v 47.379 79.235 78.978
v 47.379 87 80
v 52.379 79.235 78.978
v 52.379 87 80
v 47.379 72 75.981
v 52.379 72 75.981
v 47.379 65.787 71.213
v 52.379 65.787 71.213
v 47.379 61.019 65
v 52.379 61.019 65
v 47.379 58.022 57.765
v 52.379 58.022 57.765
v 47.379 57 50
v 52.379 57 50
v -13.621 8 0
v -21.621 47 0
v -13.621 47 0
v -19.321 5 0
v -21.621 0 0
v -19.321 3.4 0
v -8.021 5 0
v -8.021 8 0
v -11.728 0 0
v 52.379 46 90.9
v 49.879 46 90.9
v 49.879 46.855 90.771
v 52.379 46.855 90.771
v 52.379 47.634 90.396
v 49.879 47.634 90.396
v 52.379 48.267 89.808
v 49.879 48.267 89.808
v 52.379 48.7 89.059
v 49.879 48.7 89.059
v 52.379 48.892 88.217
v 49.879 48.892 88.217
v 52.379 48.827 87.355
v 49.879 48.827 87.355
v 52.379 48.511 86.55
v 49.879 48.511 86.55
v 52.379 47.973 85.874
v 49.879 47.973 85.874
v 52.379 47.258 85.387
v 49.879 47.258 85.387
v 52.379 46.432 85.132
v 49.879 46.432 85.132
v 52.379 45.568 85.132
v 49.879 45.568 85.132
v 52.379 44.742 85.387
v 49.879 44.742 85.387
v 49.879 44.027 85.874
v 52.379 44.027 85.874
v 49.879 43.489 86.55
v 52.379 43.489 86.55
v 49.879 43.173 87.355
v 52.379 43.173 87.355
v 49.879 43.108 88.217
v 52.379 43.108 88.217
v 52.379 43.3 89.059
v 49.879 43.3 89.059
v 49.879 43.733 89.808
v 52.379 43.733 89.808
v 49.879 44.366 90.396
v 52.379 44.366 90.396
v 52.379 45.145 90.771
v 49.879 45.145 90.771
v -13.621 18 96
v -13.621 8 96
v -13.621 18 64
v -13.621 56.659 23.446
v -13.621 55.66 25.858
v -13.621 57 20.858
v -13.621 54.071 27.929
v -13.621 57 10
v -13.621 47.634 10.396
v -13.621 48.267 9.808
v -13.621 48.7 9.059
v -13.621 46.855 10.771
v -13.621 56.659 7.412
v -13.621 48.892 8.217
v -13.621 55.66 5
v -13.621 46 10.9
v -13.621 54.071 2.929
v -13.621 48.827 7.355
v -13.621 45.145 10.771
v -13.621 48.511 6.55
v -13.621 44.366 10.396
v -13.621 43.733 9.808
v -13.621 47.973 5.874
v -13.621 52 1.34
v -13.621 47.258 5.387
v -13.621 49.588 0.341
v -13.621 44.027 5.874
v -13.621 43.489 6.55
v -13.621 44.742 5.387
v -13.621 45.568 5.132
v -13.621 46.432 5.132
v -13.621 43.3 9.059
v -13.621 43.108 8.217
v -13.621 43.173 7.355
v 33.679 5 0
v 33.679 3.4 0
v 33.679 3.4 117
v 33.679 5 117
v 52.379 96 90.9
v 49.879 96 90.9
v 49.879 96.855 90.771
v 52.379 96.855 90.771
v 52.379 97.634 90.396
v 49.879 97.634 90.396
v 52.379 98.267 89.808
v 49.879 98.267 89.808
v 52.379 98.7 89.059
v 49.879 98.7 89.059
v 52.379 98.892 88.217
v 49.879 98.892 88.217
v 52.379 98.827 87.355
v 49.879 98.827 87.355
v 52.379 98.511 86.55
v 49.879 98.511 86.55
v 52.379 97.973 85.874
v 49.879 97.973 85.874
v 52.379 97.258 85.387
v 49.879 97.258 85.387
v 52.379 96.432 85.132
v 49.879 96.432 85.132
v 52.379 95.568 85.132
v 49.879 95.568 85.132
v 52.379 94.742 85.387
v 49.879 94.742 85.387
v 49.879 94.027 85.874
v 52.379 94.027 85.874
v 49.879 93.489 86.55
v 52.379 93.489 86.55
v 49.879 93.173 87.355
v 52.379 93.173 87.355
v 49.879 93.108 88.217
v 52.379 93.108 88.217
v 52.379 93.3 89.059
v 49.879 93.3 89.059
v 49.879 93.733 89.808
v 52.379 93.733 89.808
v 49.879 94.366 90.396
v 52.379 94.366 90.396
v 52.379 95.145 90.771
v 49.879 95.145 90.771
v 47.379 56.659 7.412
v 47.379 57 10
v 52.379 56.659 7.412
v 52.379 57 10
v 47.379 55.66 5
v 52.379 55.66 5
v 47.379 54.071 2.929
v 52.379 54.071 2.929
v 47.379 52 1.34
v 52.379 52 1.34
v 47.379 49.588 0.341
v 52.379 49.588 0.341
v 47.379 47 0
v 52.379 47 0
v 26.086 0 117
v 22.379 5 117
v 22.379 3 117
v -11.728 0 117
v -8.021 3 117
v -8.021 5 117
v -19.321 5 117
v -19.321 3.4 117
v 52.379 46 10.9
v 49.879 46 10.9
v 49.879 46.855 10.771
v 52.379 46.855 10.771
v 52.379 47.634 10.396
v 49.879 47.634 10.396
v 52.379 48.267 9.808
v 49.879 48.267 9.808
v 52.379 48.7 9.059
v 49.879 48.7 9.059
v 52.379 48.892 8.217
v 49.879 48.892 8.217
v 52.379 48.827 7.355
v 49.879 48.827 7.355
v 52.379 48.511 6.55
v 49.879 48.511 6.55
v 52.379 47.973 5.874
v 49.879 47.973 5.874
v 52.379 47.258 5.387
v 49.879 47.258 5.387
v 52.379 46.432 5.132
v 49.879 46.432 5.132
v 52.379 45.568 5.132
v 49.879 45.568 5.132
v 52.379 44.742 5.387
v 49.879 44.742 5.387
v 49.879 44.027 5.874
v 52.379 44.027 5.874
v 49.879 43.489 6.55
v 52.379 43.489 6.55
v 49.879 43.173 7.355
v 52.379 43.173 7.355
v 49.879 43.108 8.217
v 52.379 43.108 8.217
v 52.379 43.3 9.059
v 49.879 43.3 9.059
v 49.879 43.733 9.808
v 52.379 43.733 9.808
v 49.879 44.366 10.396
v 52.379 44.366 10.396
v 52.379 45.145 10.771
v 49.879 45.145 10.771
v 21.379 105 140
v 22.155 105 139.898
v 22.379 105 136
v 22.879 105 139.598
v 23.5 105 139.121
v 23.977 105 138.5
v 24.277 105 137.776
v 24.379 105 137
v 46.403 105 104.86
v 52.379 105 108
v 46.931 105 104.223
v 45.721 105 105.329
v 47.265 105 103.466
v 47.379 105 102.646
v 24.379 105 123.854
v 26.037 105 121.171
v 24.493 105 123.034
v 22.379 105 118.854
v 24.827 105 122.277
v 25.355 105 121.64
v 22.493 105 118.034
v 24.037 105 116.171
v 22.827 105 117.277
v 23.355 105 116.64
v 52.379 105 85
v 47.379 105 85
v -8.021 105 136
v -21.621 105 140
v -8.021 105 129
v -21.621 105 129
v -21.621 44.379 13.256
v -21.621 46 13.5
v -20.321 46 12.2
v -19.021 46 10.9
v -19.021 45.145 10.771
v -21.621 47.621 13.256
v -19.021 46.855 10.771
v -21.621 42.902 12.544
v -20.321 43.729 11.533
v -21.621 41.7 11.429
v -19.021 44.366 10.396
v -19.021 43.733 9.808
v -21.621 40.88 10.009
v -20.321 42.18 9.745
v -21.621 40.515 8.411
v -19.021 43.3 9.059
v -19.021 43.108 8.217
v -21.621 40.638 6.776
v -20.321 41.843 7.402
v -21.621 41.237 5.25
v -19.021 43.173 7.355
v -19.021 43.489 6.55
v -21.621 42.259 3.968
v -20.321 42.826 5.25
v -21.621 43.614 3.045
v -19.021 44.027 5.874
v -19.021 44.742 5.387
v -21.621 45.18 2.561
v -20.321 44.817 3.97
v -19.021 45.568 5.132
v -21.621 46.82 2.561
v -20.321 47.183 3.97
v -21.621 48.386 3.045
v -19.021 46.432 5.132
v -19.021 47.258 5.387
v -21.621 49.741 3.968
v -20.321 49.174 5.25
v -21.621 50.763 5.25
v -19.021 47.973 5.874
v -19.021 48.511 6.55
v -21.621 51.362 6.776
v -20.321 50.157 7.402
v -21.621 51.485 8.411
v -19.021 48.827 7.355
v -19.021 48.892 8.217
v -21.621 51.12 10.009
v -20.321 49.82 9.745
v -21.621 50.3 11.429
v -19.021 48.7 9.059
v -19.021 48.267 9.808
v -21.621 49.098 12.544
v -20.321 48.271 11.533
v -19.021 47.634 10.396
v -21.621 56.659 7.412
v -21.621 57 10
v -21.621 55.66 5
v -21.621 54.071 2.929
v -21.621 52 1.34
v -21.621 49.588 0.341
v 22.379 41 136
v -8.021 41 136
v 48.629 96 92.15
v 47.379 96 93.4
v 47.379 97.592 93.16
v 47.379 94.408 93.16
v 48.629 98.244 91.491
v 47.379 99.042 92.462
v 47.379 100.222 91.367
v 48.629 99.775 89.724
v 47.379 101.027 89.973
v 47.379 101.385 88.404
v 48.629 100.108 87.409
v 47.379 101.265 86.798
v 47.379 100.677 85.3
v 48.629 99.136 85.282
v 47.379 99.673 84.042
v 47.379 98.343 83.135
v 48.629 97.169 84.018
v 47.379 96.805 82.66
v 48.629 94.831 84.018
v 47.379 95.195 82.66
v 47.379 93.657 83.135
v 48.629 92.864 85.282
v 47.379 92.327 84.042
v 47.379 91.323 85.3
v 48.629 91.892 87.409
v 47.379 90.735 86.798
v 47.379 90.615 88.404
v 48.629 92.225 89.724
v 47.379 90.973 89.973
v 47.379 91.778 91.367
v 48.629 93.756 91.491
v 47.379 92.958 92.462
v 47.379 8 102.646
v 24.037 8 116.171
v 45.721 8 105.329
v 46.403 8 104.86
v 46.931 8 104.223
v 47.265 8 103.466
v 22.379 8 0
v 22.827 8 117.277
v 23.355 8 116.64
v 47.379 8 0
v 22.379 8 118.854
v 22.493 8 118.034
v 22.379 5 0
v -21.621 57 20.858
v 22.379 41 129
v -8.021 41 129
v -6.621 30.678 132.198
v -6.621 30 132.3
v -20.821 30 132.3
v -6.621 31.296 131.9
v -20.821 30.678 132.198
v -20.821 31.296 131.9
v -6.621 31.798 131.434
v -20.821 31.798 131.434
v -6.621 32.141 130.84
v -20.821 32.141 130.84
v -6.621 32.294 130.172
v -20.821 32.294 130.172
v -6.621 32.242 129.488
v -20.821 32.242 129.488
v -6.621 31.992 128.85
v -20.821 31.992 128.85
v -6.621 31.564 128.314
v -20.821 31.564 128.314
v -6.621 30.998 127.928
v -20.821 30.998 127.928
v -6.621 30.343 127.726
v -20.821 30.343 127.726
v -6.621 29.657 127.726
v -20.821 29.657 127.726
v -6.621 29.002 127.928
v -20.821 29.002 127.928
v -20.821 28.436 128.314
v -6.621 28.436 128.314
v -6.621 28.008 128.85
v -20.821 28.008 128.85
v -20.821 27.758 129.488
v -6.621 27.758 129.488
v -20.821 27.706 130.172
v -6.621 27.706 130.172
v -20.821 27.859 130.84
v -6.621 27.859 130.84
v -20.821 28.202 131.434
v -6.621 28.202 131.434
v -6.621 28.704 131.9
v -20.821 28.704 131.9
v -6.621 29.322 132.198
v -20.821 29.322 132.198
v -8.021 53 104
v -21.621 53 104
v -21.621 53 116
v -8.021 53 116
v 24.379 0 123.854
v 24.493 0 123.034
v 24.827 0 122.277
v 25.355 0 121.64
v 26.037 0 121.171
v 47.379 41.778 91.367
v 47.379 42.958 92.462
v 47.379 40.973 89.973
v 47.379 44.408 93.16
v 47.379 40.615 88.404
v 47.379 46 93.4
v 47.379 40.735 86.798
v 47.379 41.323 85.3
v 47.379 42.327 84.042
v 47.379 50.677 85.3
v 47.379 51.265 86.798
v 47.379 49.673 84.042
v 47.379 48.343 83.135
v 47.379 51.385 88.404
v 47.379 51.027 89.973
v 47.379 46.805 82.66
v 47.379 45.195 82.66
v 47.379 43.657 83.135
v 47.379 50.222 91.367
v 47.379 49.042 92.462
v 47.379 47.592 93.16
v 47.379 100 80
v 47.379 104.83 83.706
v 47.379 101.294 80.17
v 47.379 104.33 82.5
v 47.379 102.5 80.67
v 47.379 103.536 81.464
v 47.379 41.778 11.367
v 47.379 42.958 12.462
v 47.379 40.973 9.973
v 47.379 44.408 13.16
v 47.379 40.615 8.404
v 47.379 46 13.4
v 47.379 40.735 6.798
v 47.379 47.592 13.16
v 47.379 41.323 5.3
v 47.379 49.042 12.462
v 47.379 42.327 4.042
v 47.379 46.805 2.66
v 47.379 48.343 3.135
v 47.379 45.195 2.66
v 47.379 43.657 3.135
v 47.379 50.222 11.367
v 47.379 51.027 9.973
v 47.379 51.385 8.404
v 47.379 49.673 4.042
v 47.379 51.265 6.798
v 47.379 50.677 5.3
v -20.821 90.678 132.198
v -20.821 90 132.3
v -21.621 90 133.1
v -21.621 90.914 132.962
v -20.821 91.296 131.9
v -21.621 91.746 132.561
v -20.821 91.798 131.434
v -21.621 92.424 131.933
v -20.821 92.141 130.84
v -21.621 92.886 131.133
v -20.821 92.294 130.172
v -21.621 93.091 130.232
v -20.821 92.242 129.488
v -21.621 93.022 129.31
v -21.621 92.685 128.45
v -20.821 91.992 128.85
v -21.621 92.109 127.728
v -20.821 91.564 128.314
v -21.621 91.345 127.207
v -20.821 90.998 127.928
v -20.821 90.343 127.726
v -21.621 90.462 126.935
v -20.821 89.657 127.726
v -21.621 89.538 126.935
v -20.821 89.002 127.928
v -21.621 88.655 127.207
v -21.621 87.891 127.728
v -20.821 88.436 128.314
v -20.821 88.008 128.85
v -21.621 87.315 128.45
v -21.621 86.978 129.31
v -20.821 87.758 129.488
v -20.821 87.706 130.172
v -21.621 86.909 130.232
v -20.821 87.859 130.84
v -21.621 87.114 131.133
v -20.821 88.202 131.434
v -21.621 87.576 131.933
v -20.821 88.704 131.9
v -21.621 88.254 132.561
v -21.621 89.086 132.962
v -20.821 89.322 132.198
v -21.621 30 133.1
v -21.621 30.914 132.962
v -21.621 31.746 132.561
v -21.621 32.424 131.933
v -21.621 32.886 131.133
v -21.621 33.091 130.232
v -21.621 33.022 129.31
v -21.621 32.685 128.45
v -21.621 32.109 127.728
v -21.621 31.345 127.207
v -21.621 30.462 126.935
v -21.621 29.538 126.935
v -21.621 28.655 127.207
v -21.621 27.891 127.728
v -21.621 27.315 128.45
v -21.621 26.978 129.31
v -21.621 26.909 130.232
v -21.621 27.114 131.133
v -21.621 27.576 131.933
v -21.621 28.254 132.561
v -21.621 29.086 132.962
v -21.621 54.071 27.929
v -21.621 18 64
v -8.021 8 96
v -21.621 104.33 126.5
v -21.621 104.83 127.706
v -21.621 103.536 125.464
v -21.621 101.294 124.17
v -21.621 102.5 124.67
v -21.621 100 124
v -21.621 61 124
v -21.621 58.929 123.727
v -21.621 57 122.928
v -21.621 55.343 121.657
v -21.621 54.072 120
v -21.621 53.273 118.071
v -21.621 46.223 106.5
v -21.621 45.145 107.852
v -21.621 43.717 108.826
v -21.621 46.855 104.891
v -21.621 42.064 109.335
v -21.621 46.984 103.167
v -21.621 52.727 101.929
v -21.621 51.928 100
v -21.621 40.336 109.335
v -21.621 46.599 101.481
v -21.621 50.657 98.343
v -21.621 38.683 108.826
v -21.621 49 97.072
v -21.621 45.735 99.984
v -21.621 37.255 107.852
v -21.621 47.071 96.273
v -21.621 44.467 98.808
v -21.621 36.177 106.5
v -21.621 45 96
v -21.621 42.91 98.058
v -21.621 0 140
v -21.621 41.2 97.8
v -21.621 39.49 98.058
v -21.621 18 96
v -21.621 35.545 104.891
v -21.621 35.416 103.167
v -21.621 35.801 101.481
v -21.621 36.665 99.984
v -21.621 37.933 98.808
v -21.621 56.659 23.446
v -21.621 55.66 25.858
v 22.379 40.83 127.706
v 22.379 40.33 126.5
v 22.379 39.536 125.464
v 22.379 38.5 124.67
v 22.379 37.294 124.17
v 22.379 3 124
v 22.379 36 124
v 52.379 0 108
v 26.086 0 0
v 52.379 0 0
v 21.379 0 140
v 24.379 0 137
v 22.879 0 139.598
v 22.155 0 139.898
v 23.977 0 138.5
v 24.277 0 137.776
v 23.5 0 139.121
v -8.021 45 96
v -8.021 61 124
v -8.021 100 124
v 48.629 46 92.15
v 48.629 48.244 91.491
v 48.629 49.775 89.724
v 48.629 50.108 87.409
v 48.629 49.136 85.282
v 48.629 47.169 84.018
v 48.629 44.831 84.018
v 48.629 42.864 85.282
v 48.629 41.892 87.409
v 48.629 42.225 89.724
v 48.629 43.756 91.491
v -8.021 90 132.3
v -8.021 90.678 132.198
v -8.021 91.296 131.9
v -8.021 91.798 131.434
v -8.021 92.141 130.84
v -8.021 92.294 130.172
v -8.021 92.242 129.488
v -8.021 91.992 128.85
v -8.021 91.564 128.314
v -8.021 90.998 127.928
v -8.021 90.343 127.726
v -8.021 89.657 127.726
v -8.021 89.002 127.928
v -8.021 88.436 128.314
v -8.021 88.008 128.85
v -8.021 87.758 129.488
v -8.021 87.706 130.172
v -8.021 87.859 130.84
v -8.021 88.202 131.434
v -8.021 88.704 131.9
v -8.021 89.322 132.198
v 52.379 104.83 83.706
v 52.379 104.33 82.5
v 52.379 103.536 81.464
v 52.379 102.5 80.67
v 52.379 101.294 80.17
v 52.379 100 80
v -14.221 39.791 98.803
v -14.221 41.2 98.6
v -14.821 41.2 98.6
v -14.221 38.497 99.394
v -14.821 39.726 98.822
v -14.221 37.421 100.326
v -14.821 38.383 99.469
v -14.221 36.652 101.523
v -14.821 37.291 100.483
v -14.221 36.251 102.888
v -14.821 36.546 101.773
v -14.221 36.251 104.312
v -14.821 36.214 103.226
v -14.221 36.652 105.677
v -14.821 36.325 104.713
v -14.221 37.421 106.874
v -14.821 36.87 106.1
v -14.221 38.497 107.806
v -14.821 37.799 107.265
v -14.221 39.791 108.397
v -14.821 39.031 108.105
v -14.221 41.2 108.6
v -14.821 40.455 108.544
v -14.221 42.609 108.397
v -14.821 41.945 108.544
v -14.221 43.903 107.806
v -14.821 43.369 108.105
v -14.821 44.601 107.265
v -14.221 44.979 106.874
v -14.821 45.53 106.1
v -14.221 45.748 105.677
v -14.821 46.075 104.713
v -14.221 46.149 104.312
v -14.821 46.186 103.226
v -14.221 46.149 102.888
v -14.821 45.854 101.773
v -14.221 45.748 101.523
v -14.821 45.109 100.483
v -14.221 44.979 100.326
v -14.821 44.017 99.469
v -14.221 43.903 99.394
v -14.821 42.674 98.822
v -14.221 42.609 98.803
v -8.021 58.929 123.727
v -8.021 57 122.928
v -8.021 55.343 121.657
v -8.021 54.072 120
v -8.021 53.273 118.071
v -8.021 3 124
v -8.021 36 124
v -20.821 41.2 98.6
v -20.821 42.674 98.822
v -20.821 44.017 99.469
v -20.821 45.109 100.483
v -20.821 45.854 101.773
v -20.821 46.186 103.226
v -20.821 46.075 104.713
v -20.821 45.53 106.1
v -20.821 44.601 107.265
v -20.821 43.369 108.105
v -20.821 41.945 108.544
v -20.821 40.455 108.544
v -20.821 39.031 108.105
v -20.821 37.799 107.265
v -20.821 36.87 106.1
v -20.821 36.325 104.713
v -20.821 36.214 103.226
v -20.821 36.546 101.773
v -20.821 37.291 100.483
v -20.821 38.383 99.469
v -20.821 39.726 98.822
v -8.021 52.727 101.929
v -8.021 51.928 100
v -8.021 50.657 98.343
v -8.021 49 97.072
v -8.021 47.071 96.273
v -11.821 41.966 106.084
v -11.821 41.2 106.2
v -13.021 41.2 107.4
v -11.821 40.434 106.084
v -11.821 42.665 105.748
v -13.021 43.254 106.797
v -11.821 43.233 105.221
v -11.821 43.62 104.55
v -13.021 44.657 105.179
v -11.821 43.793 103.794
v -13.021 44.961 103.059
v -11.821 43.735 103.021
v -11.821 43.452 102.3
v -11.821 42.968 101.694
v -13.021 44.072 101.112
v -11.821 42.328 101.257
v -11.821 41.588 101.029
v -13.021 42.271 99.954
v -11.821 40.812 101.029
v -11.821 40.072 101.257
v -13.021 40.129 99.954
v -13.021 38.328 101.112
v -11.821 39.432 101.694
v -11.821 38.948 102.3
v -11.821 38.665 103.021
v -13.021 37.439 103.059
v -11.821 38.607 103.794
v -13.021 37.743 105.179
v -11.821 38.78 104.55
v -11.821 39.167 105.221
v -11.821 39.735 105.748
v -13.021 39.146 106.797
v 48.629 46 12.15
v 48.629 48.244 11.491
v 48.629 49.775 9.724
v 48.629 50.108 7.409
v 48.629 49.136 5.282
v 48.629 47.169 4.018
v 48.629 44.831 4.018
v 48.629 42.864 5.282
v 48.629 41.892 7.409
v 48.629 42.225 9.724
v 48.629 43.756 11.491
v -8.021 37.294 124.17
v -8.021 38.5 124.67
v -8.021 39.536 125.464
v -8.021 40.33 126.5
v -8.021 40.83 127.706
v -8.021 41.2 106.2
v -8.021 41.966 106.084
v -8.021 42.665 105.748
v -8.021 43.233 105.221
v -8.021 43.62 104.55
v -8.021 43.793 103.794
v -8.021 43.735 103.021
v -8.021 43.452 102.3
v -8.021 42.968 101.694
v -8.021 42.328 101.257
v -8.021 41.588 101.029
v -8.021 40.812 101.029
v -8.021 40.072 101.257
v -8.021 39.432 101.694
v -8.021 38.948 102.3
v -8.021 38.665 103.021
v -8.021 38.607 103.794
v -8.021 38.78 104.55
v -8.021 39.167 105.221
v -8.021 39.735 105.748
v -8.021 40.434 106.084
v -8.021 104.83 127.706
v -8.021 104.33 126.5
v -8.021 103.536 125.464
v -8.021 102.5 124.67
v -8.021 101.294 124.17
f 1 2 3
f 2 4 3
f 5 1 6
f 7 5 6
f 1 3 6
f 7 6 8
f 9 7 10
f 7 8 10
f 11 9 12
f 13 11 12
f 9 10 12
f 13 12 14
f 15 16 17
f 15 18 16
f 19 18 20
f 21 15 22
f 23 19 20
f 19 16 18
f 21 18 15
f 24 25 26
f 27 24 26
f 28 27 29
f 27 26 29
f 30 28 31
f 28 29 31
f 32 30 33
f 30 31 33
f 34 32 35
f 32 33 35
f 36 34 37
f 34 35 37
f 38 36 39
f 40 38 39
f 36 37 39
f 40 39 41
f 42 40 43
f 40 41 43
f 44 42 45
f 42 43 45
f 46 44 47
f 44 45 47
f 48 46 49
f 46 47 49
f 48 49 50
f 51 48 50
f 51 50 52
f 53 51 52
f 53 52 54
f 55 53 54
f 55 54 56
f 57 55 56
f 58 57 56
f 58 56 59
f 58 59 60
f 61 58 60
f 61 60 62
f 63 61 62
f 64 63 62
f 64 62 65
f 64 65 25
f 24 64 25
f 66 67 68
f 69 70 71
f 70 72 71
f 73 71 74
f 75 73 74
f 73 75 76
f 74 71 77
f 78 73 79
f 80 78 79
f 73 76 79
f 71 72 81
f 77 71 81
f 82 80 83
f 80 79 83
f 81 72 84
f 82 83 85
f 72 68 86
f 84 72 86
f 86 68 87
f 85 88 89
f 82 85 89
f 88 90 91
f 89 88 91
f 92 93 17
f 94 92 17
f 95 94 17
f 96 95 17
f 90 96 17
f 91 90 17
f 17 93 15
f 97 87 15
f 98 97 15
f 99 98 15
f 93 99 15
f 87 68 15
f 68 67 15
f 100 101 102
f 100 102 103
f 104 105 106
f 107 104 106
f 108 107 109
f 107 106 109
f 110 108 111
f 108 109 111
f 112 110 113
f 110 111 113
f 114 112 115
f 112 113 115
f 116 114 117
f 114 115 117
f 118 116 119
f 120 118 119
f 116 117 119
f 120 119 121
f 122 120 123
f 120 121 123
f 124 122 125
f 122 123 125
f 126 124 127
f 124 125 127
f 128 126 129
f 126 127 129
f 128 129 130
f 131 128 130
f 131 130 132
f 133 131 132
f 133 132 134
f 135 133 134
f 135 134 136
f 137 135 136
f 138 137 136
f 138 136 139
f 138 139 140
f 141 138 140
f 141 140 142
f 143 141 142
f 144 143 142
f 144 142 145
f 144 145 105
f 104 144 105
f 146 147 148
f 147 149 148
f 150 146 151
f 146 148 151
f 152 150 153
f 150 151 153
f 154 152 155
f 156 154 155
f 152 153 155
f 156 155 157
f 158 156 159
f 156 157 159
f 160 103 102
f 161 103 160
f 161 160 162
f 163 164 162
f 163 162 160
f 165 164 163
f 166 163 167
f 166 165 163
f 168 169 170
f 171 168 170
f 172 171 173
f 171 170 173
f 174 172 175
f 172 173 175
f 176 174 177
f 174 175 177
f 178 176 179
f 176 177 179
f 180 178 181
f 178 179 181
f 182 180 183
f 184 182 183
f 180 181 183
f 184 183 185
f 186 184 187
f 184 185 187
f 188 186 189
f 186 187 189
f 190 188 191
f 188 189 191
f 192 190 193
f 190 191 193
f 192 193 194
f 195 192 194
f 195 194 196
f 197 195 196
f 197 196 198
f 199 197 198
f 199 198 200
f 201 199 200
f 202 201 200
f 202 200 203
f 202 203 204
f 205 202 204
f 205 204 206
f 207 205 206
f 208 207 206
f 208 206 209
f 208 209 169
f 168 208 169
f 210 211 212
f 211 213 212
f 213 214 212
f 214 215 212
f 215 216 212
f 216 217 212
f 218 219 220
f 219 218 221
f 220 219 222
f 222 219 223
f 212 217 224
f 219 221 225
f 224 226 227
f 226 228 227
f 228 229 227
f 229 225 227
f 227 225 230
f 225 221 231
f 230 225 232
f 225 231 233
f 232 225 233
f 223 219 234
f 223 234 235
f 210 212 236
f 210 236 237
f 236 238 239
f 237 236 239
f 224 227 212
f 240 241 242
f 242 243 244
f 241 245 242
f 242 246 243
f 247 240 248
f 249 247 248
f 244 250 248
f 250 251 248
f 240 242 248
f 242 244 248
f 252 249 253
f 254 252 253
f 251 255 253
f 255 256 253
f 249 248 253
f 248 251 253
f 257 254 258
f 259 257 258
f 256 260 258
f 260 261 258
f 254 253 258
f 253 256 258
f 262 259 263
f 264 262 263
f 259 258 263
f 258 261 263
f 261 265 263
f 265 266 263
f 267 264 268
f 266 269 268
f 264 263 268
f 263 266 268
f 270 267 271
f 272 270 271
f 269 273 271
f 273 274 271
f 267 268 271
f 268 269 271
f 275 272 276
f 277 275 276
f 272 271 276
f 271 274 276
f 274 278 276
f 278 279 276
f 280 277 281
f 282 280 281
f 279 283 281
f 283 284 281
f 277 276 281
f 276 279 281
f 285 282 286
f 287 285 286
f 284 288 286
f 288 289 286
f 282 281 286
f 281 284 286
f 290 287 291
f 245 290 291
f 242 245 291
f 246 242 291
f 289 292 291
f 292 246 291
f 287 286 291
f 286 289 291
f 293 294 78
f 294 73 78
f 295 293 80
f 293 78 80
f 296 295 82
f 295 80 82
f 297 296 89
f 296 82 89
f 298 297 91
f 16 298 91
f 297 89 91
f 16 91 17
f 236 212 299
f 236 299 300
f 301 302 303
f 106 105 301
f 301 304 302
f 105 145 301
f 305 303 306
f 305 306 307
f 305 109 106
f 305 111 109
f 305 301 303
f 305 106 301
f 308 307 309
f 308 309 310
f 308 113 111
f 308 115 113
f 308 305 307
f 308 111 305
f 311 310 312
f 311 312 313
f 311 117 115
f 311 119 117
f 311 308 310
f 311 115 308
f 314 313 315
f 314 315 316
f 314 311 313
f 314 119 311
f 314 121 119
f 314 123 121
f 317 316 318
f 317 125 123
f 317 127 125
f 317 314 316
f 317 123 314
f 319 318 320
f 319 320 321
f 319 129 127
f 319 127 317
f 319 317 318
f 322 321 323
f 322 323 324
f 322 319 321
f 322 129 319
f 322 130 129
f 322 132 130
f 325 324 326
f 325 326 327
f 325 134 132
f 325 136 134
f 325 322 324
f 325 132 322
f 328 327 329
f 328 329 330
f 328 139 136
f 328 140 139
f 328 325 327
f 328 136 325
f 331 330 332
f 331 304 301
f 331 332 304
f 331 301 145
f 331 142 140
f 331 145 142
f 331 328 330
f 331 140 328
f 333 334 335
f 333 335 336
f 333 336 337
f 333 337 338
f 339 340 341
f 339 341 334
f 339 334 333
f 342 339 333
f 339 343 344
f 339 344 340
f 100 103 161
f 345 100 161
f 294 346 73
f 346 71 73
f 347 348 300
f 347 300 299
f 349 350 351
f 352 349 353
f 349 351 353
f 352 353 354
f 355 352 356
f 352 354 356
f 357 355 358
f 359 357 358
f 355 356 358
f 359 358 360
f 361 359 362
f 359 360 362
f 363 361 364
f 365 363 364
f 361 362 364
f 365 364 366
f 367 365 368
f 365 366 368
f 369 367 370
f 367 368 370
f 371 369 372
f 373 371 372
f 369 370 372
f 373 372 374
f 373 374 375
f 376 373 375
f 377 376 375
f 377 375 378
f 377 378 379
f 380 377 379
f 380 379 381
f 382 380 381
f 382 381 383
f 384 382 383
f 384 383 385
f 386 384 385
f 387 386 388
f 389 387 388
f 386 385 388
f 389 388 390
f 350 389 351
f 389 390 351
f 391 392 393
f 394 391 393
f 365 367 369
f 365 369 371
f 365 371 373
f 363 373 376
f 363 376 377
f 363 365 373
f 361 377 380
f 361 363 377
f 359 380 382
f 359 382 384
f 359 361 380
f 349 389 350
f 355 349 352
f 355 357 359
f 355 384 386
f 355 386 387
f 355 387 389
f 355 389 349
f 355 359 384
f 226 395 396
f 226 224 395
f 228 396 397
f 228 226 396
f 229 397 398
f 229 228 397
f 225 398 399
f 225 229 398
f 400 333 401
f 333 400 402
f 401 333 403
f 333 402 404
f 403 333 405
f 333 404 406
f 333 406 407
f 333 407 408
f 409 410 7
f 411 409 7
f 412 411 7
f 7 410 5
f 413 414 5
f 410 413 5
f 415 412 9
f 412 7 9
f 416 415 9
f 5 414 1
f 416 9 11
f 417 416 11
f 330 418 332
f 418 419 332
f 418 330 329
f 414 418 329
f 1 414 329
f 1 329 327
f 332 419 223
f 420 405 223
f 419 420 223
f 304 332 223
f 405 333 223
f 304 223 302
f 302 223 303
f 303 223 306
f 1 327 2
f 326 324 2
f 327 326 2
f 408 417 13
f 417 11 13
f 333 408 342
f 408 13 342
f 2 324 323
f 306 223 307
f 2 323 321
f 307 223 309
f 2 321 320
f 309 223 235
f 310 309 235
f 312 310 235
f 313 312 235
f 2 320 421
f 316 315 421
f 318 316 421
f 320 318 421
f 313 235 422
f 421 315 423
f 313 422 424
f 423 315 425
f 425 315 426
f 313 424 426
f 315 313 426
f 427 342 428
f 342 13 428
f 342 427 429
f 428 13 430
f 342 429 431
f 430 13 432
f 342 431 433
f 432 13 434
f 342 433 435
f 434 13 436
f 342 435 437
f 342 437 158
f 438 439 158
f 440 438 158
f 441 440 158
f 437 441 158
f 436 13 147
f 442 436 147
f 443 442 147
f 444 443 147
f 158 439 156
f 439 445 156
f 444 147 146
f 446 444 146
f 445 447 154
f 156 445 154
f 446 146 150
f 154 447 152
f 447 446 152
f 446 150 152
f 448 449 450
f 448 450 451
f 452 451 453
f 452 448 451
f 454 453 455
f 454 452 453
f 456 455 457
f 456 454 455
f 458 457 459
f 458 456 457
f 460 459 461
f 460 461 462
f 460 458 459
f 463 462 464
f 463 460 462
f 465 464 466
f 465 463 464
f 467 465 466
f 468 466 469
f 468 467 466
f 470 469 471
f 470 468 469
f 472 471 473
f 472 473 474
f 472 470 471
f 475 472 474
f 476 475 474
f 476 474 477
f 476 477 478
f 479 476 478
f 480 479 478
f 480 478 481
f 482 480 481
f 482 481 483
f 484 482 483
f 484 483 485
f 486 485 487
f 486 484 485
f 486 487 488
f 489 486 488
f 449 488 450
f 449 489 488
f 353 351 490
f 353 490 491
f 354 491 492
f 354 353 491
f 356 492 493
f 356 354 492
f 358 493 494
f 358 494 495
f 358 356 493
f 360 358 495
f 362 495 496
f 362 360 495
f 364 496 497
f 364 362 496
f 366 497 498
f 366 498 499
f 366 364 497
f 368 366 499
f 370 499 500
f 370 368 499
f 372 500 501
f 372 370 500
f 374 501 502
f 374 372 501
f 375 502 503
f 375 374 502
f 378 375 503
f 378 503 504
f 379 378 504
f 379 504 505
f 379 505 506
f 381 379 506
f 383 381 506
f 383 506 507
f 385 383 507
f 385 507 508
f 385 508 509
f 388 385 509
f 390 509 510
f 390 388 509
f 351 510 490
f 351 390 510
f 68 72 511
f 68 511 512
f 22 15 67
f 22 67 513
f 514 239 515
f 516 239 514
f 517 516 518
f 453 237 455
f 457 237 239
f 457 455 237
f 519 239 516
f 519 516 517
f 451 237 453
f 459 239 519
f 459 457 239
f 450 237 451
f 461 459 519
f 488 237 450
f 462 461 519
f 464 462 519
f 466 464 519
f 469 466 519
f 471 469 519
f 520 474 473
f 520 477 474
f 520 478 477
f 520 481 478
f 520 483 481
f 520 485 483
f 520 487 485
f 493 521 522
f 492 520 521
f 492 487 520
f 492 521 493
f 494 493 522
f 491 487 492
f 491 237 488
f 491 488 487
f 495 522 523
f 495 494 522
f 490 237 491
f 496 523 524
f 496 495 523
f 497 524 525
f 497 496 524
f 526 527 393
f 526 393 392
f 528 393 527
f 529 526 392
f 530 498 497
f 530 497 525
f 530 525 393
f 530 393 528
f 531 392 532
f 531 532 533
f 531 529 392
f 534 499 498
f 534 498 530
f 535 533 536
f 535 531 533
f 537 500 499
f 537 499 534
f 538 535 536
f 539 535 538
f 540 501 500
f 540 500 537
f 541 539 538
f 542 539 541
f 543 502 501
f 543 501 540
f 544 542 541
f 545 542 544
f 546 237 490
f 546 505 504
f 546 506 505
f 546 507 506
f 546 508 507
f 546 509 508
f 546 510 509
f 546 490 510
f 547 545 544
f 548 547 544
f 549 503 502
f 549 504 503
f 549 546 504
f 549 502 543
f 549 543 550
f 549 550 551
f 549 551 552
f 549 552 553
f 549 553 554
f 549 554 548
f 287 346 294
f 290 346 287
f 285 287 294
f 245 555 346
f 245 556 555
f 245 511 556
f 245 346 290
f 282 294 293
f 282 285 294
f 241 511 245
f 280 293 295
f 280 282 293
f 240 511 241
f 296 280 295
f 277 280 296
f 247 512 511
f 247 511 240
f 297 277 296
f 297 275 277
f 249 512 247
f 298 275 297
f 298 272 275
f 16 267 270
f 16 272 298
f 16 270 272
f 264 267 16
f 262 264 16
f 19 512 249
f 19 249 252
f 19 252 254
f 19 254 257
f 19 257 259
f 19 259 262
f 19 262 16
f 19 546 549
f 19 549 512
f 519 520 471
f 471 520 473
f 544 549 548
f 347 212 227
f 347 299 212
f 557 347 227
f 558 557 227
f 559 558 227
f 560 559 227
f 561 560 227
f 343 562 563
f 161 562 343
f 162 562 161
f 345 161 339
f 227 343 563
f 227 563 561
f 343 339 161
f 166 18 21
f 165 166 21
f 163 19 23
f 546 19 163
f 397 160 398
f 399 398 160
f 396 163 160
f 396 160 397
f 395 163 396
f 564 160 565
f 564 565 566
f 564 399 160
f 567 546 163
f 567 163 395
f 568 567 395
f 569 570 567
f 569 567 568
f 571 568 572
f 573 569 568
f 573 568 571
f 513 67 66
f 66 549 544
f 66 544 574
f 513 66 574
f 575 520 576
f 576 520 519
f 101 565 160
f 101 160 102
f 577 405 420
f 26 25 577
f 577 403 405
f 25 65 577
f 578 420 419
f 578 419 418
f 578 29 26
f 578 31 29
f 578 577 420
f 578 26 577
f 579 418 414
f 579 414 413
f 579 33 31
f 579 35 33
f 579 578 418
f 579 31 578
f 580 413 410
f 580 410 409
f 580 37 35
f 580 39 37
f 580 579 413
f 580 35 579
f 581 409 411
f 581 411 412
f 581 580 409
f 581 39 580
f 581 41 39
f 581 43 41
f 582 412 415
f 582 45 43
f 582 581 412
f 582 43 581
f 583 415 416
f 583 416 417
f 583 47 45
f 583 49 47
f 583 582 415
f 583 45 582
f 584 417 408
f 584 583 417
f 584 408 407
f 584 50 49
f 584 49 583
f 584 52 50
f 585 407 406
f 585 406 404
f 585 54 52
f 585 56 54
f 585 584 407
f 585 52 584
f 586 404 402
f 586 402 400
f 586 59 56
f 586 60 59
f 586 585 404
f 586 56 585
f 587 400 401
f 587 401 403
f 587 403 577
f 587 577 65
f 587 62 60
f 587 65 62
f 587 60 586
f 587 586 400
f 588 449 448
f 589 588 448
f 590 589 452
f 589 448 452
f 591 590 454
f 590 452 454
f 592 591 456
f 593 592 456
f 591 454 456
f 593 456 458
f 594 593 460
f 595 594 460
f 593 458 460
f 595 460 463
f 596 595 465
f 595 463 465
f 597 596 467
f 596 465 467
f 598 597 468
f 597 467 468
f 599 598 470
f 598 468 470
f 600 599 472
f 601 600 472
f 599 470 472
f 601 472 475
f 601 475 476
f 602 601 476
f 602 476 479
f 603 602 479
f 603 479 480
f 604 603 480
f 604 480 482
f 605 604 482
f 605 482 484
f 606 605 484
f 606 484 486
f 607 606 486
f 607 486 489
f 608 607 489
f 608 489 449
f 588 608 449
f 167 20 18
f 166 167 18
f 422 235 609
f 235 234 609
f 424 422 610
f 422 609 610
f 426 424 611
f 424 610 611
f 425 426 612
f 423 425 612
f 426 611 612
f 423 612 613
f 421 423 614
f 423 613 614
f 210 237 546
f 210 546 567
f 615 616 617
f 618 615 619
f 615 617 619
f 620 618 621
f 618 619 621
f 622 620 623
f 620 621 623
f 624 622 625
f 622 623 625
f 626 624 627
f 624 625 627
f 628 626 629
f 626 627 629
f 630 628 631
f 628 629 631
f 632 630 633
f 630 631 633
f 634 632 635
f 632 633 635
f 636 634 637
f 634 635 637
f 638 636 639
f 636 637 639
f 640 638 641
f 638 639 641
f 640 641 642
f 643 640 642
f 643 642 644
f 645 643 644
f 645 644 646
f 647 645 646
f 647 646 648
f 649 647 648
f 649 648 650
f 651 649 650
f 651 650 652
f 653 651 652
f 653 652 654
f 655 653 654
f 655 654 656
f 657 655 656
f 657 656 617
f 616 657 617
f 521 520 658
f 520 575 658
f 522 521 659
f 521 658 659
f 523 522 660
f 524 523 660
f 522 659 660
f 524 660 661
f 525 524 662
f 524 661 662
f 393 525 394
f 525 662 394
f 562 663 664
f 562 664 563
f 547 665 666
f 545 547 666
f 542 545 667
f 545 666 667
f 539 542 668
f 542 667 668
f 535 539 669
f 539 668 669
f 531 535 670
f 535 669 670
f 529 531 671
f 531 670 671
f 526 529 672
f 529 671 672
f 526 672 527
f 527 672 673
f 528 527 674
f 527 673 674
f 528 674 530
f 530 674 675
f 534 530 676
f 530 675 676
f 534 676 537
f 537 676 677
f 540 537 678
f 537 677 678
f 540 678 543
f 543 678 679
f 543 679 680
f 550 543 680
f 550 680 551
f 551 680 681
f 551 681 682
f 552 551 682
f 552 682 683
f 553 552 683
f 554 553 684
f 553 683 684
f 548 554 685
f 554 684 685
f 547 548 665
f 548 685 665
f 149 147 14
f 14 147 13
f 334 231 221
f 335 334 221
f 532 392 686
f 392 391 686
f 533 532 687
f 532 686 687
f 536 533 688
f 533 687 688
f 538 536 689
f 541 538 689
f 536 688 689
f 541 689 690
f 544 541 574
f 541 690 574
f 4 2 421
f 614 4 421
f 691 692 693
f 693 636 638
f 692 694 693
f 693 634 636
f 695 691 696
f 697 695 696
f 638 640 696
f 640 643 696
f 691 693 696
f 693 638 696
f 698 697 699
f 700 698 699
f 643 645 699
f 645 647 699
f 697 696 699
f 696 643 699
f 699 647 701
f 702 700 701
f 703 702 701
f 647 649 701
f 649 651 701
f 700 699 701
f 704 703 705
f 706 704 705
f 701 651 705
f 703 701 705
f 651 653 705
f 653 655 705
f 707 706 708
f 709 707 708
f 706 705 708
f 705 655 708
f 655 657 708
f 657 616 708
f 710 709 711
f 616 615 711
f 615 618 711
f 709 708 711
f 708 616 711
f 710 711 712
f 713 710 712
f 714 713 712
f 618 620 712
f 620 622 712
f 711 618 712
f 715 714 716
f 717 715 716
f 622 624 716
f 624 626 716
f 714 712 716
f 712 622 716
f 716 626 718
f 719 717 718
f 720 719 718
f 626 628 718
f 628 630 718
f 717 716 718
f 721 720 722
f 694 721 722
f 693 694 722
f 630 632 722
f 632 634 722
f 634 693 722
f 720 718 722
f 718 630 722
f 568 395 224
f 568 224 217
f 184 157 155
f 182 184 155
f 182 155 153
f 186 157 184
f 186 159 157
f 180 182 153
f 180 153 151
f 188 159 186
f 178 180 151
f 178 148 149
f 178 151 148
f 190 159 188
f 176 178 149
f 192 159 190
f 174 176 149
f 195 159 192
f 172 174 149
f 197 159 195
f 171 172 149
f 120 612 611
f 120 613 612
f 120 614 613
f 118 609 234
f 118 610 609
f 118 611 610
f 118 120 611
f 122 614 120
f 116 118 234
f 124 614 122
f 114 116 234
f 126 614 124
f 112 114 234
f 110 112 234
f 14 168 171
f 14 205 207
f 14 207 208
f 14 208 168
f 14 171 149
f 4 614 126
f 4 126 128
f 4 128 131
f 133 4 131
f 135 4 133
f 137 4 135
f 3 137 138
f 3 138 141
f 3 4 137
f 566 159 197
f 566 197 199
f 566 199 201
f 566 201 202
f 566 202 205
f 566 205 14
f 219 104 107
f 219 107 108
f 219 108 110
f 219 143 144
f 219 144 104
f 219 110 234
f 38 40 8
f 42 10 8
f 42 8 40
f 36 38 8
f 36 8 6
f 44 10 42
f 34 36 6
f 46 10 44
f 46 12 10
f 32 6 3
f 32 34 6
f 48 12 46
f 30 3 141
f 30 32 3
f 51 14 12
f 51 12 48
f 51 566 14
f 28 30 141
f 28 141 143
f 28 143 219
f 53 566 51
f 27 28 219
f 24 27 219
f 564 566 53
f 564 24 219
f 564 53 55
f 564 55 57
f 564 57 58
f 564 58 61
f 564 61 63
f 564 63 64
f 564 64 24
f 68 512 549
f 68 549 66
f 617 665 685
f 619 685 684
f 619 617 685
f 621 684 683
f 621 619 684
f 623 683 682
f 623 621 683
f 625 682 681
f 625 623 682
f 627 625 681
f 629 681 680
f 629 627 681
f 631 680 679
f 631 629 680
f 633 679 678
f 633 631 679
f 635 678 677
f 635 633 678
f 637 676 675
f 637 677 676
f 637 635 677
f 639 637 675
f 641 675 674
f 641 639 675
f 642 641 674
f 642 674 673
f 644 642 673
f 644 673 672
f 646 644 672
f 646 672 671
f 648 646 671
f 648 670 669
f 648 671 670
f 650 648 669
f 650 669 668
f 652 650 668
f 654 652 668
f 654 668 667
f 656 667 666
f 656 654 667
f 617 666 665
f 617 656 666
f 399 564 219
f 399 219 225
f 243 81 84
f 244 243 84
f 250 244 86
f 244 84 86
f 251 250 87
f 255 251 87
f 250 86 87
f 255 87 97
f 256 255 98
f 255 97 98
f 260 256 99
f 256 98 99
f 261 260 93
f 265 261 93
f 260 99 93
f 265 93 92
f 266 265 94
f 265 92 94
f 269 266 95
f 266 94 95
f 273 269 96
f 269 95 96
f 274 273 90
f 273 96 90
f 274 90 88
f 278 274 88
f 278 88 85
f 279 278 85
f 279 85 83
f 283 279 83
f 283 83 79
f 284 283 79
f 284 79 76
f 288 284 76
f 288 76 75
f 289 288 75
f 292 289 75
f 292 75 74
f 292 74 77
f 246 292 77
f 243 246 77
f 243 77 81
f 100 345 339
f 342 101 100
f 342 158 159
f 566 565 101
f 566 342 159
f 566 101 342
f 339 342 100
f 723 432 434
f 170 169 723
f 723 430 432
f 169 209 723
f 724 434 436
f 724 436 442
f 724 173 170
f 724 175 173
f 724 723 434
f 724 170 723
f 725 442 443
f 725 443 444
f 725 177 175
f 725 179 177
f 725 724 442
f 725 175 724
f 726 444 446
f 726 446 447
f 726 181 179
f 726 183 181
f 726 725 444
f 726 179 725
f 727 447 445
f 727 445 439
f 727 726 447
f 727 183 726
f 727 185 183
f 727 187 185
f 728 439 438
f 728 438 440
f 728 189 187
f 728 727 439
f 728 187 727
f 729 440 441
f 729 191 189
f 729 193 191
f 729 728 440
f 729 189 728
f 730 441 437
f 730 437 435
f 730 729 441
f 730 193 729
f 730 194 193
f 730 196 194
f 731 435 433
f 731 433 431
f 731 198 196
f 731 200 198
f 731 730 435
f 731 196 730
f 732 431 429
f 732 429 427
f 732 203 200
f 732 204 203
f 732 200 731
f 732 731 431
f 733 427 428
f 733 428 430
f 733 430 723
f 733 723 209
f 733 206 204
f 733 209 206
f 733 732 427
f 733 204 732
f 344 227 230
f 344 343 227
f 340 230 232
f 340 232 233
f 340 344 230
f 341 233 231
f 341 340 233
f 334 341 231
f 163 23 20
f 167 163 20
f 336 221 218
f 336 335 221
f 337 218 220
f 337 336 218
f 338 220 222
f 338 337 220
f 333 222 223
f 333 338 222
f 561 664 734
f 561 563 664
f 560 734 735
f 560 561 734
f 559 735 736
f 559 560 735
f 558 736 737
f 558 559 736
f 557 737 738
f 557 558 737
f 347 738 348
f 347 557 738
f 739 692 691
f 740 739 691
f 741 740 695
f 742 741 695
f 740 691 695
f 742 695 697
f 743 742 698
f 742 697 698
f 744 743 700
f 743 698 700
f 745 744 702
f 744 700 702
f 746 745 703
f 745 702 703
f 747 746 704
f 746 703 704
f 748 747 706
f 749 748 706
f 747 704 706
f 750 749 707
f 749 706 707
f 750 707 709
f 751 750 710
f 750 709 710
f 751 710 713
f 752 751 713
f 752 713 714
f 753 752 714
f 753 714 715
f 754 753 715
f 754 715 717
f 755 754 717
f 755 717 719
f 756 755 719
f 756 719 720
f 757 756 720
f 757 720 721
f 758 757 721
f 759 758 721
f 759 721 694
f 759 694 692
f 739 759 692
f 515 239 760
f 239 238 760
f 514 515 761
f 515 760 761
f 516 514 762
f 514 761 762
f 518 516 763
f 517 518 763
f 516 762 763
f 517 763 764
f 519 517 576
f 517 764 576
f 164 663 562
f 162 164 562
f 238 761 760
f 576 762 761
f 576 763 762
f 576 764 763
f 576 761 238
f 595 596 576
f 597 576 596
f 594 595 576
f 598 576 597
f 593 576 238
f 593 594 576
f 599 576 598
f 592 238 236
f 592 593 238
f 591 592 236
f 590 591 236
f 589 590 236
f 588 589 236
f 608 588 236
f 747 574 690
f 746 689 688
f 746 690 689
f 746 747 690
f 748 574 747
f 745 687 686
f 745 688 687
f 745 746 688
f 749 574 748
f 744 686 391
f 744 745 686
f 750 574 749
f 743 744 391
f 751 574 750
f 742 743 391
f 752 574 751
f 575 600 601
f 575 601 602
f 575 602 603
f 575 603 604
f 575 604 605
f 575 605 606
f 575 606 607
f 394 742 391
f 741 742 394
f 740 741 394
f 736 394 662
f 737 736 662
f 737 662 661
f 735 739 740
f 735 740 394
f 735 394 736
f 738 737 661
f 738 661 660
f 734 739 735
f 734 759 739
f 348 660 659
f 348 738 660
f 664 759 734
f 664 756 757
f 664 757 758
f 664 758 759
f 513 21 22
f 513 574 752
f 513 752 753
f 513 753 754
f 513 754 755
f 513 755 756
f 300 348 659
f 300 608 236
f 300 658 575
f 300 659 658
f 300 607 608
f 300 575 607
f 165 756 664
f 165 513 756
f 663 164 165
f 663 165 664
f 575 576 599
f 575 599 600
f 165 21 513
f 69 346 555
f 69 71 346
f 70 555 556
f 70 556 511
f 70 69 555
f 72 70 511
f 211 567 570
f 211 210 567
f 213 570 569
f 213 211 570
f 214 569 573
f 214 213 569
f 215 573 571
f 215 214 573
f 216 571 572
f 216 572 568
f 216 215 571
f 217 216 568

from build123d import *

# Parameters (mm, degrees)
EXTRUDE_1_DEPTH          = 105
SKETCH_7_W               = 30.4
SKETCH_7_H               = 19
EXTRUDE_2_DEPTH          = 3
SKETCH_8_W               = 30.4
SKETCH_8_H               = 12
EXTRUDE_3_DEPTH          = 38
FILLET_1_R               = 5
CUT_EXTRUDE_1_DEPTH      = 117
CUT_EXTRUDE_2_DEPTH      = 97
CUT_EXTRUDE_4_DEPTH      = 191.002631561
CUT_EXTRUDE_4_DEPTH_BACK = 6.8
SKETCH_11_R              = 5
FILLET_3_R               = 3
SKETCH_12_R              = 2.6
CUT_EXTRUDE_5_DEPTH      = 20
CHAMFER_1_SIZE           = 3
SKETCH_13_R              = 2.9
CUT_EXTRUDE_6_DEPTH      = 191.002631561
CHAMFER_3_SIZE           = 2.5
SKETCH_16_W              = 80
SKETCH_16_H              = 48
CUT_EXTRUDE_9_DEPTH      = 191.002631561
FILLET_4_R               = 30
SKETCH_17_W              = 28
SKETCH_17_H              = 52
CUT_EXTRUDE_10_DEPTH     = 20
FILLET_5_R               = 8
SKETCH_18_W              = 8
SKETCH_18_H              = 24
EXTRUDE_4_DEPTH          = 49
CHAMFER_4_SIZE           = 50
FILLET_6_R               = 10
SKETCH_19_R              = 2.9
CUT_EXTRUDE_11_DEPTH     = 191.002631561
CHAMFER_5_SIZE           = 2.6
SKETCH_21_R              = 2.3
CUT_EXTRUDE_13_DEPTH     = 15
FILLET_7_R               = 5
CHAMFER_6_SIZE           = 0.8
SKETCH_22_W              = 8
SKETCH_22_H              = 48.683816014
EXTRUDE_5_DEPTH          = 10
FILLET_8_R               = 10


with BuildPart() as part:
    # Эскиз2 → Бобышка-Вытянуть1 (new body)
    with BuildSketch(Plane(origin=(0, 0, 0), x_dir=(1, 0, 0), z_dir=(0, 1, 0))):
        Polygon((52.378939236, 0), (52.378939236, -108), (24.378939236, -122), (24.378939236, -140), (0, -140), (-21.621060764, -140), (-21.621060764, 0), (-8.021060764, 0), (-8.021060764, -136), (0, -136), (22.378939236, -136), (22.378939236, 0), align=None)
    extrude(amount=EXTRUDE_1_DEPTH)



with BuildPart() as body_2:
    # Эскиз7 → Бобышка-Вытянуть2 (new body)
    with BuildSketch(Plane.XZ):
        with Locations((7.178939236, 126.5)):
            Rectangle(SKETCH_7_W, SKETCH_7_H)
    extrude(amount=-EXTRUDE_2_DEPTH)


with BuildPart() as part_1:
    add(part.part)

    add(body_2.part)  # Бобышка-Вытянуть3 merges body 2
    # Эскиз8 → Бобышка-Вытянуть3 (add)
    with BuildSketch(Plane(origin=(0, 3, 0), x_dir=(1, 0, 0), z_dir=(0, 1, 0))):
        with Locations((7.178939236, -130)):
            Rectangle(SKETCH_8_W, SKETCH_8_H)
    extrude(amount=EXTRUDE_3_DEPTH)

    # Скругление1
    fillet_1_edges = [part_1.edges().sort_by_distance(p)[0] for p in [
        (7.178939236, 41, 124),
    ]]
    fillet(fillet_1_edges, radius=FILLET_1_R)

    # Эскиз3 → Вырез-Вытянуть1 (cut)
    with BuildSketch(Plane(origin=(0, 0, 0), x_dir=(-1, 0, 0), z_dir=(0, 0, -1))):
        Polygon((8.021060764, -1.66), (19.321060764, 3.4), (19.321060764, 5), (8.021060764, 5), align=None)
        Polygon((-33.678939236, 5), (-22.378939236, 5), (-22.378939236, -1.66), (-33.678939236, 3.4), align=None)
    extrude(amount=-CUT_EXTRUDE_1_DEPTH, mode=Mode.SUBTRACT)

    # Эскиз9 → Вырез-Вытянуть2 (cut)
    with BuildSketch(Plane(origin=(0, 105, 0), x_dir=(1, 0, 0), z_dir=(0, 1, 0))):
        Polygon((-21.621060764, 0), (-21.621060764, -96), (22.378939236, -96), (22.378939236, -117), (47.378939236, -104.5), (47.378939236, 0), align=None)
    extrude(amount=-CUT_EXTRUDE_2_DEPTH, mode=Mode.SUBTRACT)

    # Эскиз11 → Вырез-Вытянуть4 (cut, two sides: drawn at the far end of the back side and taken through both)
    with BuildSketch(Plane.ZY.offset(21.621060764).offset(-CUT_EXTRUDE_4_DEPTH_BACK)):
        with Locations(Location((103.6, 41.2, 0), (0, 0, 180))):
            Circle(SKETCH_11_R)
    extrude(amount=CUT_EXTRUDE_4_DEPTH + CUT_EXTRUDE_4_DEPTH_BACK, mode=Mode.SUBTRACT)

    # Скругление3
    fillet_3_edges = [part_1.edges().sort_by_distance(p)[0] for p in [
        (47.378939236, 56.5, 104.5),
        (22.378939236, 56.5, 117),
        (24.378939236, 52.5, 140),
        (24.378939236, 52.5, 122),
    ]]
    fillet(fillet_3_edges, radius=FILLET_3_R)

    # Эскиз12 → Вырез-Вытянуть5 (cut)
    with BuildSketch(Plane.ZY.offset(21.621060764)):
        with Locations((103.6, 41.2)):
            Circle(SKETCH_12_R)
    extrude(amount=-CUT_EXTRUDE_5_DEPTH, mode=Mode.SUBTRACT)

    # Фаска1
    # the kernel refuses this chamfer: 3 mm, written as the material it takes off along each edge
    with BuildSketch(Plane(origin=(-14.821060764, 41.2, 103.6), x_dir=(0, 0, 1), z_dir=(0, -1, 0))) as chamfer_1_piece_1_section:
        Polygon((2.6, -CHAMFER_1_SIZE), (2.6 + CHAMFER_1_SIZE, 0), (2.6, 0), align=None)
    chamfer_1_piece_1 = revolve(axis=Axis((-14.821060764, 41.2, 103.6), (-1, 0, 0)), mode=Mode.PRIVATE)
    chamfer_1_piece_1 = chamfer_1_piece_1 & Plane(origin=(-13.01179882, 41.2, 103.6), x_dir=(0, 0, -1), z_dir=(-1, 0, 0)) * Cylinder(5, 23, mode=Mode.PRIVATE)
    add(chamfer_1_piece_1, mode=Mode.SUBTRACT)

    # Эскиз13 → Вырез-Вытянуть6 (cut, through all)
    with BuildSketch(Plane.ZY.offset(21.621060764)):
        with Locations((88, 46)):
            Circle(SKETCH_13_R)
        with Locations((8, 46)):
            Circle(SKETCH_13_R)
        with Locations((88, 96)):
            Circle(SKETCH_13_R)
    extrude(amount=-CUT_EXTRUDE_6_DEPTH, mode=Mode.SUBTRACT)

    # Фаска3
    chamfer_3_edges = [part_1.edges().sort_by_distance(p)[0] for p in [
        (47.378939236, 96, 85.1),
        (47.378939236, 46, 5.1),
        (47.378939236, 46, 85.1),
    ]]
    chamfer(chamfer_3_edges, length=CHAMFER_3_SIZE)

    # Эскиз16 → Вырез-Вытянуть9 (cut, through all)
    with BuildSketch(Plane.ZY.offset(21.621060764)):
        with Locations((40, 81)):
            Rectangle(SKETCH_16_W, SKETCH_16_H)
    extrude(amount=-CUT_EXTRUDE_9_DEPTH, mode=Mode.SUBTRACT)

    # Скругление4
    fillet_4_edges = [part_1.edges().sort_by_distance(p)[0] for p in [
        (49.878939236, 57, 80),
    ]]
    fillet(fillet_4_edges, radius=FILLET_4_R)

    # Эскиз17 → Вырез-Вытянуть10 (cut)
    with BuildSketch(Plane.ZY.offset(21.621060764)):
        with Locations((110, 79)):
            Rectangle(SKETCH_17_W, SKETCH_17_H)
    extrude(amount=-CUT_EXTRUDE_10_DEPTH, mode=Mode.SUBTRACT)

    # Скругление5
    fillet_5_edges = [part_1.edges().sort_by_distance(p)[0] for p in [
        (-14.821060764, 53, 96),
        (-14.821060764, 53, 124),
    ]]
    fillet(fillet_5_edges, radius=FILLET_5_R)

    # Эскиз18 → Бобышка-Вытянуть4 (add)
    with BuildSketch(Plane(origin=(0, 8, 0), x_dir=(1, 0, 0), z_dir=(0, 1, 0))):
        with Locations((-17.621060764, -12)):
            Rectangle(SKETCH_18_W, SKETCH_18_H)
    extrude(amount=EXTRUDE_4_DEPTH)

    # Фаска4
    # the kernel refuses this chamfer: 50 mm, written as the material it adds along each edge
    with BuildSketch(Plane(origin=(-13.621060764, 8, 24), x_dir=(0, 0.9996219169112966, -0.027495876610586386), z_dir=(-1, 0, 0))) as chamfer_4_piece_1_section:
        Polygon((CHAMFER_4_SIZE * 0.999621916911, -CHAMFER_4_SIZE * 0.0274958766106), (-CHAMFER_4_SIZE * 0.0274958766106, -CHAMFER_4_SIZE * 0.999621916911), (0, 0), align=None)
    chamfer_4_piece_1 = extrude(amount=8, mode=Mode.PRIVATE)
    chamfer_4_piece_1 = split(chamfer_4_piece_1, bisect_by=Plane(origin=(-17.621060764, 57, 40.555220818), z_dir=(0, -1, 0)), keep=Keep.TOP, mode=Mode.PRIVATE)
    add(chamfer_4_piece_1)

    # Скругление6
    fillet_6_edges = [part_1.edges().sort_by_distance(p)[0] for p in [
        (49.878939236, 57, 0),
        (-17.621060764, 57, 0),
    ]]
    fillet(fillet_6_edges, radius=FILLET_6_R)

    # Эскиз19 → Вырез-Вытянуть11 (cut, through all)
    with BuildSketch(Plane(origin=(52.378939236, 0, 0), x_dir=(0, 0, -1), z_dir=(1, 0, 0))):
        with Locations(Location((-8, 46, 0), (0, 0, 180))):
            Circle(SKETCH_19_R)
    extrude(amount=-CUT_EXTRUDE_11_DEPTH, mode=Mode.SUBTRACT)

    # Фаска5
    chamfer_5_edges = [part_1.edges().sort_by_distance(p)[0] for p in [
        (-21.621060764, 46, 5.1),
    ]]
    chamfer(chamfer_5_edges, length=CHAMFER_5_SIZE)

    # Эскиз21 → Вырез-Вытянуть13 (cut)
    with BuildSketch(Plane.ZY.offset(21.621060764)):
        with Locations((130, 30)):
            Circle(SKETCH_21_R)
        with Locations((130, 90)):
            Circle(SKETCH_21_R)
    extrude(amount=-CUT_EXTRUDE_13_DEPTH, mode=Mode.SUBTRACT)

    # Скругление7
    fillet_7_edges = [part_1.edges().sort_by_distance(p)[0] for p in [
        (49.878939236, 105, 80),
        (-14.821060764, 105, 124),
    ]]
    fillet(fillet_7_edges, radius=FILLET_7_R)

    # Фаска6
    chamfer_6_edges = [part_1.edges().sort_by_distance(p)[0] for p in [
        (-21.621060764, 41.2, 108.6),
        (-21.621060764, 30, 127.7),
        (-21.621060764, 90, 127.7),
    ]]
    chamfer(chamfer_6_edges, length=CHAMFER_6_SIZE)

    # Эскиз22 → Бобышка-Вытянуть5 (add)
    with BuildSketch(Plane(origin=(0, 8, 0), x_dir=(1, 0, 0), z_dir=(0, 1, 0))):
        with Locations((-17.621060764, -71.658091993)):
            Rectangle(SKETCH_22_W, SKETCH_22_H)
    extrude(amount=EXTRUDE_5_DEPTH)

    # Скругление8
    fillet_8_edges = [part_1.edges().sort_by_distance(p)[0] for p in [
        (-17.621060764, 57, 25),
    ]]
    fillet(fillet_8_edges, radius=FILLET_8_R)


solid = part_1.part
